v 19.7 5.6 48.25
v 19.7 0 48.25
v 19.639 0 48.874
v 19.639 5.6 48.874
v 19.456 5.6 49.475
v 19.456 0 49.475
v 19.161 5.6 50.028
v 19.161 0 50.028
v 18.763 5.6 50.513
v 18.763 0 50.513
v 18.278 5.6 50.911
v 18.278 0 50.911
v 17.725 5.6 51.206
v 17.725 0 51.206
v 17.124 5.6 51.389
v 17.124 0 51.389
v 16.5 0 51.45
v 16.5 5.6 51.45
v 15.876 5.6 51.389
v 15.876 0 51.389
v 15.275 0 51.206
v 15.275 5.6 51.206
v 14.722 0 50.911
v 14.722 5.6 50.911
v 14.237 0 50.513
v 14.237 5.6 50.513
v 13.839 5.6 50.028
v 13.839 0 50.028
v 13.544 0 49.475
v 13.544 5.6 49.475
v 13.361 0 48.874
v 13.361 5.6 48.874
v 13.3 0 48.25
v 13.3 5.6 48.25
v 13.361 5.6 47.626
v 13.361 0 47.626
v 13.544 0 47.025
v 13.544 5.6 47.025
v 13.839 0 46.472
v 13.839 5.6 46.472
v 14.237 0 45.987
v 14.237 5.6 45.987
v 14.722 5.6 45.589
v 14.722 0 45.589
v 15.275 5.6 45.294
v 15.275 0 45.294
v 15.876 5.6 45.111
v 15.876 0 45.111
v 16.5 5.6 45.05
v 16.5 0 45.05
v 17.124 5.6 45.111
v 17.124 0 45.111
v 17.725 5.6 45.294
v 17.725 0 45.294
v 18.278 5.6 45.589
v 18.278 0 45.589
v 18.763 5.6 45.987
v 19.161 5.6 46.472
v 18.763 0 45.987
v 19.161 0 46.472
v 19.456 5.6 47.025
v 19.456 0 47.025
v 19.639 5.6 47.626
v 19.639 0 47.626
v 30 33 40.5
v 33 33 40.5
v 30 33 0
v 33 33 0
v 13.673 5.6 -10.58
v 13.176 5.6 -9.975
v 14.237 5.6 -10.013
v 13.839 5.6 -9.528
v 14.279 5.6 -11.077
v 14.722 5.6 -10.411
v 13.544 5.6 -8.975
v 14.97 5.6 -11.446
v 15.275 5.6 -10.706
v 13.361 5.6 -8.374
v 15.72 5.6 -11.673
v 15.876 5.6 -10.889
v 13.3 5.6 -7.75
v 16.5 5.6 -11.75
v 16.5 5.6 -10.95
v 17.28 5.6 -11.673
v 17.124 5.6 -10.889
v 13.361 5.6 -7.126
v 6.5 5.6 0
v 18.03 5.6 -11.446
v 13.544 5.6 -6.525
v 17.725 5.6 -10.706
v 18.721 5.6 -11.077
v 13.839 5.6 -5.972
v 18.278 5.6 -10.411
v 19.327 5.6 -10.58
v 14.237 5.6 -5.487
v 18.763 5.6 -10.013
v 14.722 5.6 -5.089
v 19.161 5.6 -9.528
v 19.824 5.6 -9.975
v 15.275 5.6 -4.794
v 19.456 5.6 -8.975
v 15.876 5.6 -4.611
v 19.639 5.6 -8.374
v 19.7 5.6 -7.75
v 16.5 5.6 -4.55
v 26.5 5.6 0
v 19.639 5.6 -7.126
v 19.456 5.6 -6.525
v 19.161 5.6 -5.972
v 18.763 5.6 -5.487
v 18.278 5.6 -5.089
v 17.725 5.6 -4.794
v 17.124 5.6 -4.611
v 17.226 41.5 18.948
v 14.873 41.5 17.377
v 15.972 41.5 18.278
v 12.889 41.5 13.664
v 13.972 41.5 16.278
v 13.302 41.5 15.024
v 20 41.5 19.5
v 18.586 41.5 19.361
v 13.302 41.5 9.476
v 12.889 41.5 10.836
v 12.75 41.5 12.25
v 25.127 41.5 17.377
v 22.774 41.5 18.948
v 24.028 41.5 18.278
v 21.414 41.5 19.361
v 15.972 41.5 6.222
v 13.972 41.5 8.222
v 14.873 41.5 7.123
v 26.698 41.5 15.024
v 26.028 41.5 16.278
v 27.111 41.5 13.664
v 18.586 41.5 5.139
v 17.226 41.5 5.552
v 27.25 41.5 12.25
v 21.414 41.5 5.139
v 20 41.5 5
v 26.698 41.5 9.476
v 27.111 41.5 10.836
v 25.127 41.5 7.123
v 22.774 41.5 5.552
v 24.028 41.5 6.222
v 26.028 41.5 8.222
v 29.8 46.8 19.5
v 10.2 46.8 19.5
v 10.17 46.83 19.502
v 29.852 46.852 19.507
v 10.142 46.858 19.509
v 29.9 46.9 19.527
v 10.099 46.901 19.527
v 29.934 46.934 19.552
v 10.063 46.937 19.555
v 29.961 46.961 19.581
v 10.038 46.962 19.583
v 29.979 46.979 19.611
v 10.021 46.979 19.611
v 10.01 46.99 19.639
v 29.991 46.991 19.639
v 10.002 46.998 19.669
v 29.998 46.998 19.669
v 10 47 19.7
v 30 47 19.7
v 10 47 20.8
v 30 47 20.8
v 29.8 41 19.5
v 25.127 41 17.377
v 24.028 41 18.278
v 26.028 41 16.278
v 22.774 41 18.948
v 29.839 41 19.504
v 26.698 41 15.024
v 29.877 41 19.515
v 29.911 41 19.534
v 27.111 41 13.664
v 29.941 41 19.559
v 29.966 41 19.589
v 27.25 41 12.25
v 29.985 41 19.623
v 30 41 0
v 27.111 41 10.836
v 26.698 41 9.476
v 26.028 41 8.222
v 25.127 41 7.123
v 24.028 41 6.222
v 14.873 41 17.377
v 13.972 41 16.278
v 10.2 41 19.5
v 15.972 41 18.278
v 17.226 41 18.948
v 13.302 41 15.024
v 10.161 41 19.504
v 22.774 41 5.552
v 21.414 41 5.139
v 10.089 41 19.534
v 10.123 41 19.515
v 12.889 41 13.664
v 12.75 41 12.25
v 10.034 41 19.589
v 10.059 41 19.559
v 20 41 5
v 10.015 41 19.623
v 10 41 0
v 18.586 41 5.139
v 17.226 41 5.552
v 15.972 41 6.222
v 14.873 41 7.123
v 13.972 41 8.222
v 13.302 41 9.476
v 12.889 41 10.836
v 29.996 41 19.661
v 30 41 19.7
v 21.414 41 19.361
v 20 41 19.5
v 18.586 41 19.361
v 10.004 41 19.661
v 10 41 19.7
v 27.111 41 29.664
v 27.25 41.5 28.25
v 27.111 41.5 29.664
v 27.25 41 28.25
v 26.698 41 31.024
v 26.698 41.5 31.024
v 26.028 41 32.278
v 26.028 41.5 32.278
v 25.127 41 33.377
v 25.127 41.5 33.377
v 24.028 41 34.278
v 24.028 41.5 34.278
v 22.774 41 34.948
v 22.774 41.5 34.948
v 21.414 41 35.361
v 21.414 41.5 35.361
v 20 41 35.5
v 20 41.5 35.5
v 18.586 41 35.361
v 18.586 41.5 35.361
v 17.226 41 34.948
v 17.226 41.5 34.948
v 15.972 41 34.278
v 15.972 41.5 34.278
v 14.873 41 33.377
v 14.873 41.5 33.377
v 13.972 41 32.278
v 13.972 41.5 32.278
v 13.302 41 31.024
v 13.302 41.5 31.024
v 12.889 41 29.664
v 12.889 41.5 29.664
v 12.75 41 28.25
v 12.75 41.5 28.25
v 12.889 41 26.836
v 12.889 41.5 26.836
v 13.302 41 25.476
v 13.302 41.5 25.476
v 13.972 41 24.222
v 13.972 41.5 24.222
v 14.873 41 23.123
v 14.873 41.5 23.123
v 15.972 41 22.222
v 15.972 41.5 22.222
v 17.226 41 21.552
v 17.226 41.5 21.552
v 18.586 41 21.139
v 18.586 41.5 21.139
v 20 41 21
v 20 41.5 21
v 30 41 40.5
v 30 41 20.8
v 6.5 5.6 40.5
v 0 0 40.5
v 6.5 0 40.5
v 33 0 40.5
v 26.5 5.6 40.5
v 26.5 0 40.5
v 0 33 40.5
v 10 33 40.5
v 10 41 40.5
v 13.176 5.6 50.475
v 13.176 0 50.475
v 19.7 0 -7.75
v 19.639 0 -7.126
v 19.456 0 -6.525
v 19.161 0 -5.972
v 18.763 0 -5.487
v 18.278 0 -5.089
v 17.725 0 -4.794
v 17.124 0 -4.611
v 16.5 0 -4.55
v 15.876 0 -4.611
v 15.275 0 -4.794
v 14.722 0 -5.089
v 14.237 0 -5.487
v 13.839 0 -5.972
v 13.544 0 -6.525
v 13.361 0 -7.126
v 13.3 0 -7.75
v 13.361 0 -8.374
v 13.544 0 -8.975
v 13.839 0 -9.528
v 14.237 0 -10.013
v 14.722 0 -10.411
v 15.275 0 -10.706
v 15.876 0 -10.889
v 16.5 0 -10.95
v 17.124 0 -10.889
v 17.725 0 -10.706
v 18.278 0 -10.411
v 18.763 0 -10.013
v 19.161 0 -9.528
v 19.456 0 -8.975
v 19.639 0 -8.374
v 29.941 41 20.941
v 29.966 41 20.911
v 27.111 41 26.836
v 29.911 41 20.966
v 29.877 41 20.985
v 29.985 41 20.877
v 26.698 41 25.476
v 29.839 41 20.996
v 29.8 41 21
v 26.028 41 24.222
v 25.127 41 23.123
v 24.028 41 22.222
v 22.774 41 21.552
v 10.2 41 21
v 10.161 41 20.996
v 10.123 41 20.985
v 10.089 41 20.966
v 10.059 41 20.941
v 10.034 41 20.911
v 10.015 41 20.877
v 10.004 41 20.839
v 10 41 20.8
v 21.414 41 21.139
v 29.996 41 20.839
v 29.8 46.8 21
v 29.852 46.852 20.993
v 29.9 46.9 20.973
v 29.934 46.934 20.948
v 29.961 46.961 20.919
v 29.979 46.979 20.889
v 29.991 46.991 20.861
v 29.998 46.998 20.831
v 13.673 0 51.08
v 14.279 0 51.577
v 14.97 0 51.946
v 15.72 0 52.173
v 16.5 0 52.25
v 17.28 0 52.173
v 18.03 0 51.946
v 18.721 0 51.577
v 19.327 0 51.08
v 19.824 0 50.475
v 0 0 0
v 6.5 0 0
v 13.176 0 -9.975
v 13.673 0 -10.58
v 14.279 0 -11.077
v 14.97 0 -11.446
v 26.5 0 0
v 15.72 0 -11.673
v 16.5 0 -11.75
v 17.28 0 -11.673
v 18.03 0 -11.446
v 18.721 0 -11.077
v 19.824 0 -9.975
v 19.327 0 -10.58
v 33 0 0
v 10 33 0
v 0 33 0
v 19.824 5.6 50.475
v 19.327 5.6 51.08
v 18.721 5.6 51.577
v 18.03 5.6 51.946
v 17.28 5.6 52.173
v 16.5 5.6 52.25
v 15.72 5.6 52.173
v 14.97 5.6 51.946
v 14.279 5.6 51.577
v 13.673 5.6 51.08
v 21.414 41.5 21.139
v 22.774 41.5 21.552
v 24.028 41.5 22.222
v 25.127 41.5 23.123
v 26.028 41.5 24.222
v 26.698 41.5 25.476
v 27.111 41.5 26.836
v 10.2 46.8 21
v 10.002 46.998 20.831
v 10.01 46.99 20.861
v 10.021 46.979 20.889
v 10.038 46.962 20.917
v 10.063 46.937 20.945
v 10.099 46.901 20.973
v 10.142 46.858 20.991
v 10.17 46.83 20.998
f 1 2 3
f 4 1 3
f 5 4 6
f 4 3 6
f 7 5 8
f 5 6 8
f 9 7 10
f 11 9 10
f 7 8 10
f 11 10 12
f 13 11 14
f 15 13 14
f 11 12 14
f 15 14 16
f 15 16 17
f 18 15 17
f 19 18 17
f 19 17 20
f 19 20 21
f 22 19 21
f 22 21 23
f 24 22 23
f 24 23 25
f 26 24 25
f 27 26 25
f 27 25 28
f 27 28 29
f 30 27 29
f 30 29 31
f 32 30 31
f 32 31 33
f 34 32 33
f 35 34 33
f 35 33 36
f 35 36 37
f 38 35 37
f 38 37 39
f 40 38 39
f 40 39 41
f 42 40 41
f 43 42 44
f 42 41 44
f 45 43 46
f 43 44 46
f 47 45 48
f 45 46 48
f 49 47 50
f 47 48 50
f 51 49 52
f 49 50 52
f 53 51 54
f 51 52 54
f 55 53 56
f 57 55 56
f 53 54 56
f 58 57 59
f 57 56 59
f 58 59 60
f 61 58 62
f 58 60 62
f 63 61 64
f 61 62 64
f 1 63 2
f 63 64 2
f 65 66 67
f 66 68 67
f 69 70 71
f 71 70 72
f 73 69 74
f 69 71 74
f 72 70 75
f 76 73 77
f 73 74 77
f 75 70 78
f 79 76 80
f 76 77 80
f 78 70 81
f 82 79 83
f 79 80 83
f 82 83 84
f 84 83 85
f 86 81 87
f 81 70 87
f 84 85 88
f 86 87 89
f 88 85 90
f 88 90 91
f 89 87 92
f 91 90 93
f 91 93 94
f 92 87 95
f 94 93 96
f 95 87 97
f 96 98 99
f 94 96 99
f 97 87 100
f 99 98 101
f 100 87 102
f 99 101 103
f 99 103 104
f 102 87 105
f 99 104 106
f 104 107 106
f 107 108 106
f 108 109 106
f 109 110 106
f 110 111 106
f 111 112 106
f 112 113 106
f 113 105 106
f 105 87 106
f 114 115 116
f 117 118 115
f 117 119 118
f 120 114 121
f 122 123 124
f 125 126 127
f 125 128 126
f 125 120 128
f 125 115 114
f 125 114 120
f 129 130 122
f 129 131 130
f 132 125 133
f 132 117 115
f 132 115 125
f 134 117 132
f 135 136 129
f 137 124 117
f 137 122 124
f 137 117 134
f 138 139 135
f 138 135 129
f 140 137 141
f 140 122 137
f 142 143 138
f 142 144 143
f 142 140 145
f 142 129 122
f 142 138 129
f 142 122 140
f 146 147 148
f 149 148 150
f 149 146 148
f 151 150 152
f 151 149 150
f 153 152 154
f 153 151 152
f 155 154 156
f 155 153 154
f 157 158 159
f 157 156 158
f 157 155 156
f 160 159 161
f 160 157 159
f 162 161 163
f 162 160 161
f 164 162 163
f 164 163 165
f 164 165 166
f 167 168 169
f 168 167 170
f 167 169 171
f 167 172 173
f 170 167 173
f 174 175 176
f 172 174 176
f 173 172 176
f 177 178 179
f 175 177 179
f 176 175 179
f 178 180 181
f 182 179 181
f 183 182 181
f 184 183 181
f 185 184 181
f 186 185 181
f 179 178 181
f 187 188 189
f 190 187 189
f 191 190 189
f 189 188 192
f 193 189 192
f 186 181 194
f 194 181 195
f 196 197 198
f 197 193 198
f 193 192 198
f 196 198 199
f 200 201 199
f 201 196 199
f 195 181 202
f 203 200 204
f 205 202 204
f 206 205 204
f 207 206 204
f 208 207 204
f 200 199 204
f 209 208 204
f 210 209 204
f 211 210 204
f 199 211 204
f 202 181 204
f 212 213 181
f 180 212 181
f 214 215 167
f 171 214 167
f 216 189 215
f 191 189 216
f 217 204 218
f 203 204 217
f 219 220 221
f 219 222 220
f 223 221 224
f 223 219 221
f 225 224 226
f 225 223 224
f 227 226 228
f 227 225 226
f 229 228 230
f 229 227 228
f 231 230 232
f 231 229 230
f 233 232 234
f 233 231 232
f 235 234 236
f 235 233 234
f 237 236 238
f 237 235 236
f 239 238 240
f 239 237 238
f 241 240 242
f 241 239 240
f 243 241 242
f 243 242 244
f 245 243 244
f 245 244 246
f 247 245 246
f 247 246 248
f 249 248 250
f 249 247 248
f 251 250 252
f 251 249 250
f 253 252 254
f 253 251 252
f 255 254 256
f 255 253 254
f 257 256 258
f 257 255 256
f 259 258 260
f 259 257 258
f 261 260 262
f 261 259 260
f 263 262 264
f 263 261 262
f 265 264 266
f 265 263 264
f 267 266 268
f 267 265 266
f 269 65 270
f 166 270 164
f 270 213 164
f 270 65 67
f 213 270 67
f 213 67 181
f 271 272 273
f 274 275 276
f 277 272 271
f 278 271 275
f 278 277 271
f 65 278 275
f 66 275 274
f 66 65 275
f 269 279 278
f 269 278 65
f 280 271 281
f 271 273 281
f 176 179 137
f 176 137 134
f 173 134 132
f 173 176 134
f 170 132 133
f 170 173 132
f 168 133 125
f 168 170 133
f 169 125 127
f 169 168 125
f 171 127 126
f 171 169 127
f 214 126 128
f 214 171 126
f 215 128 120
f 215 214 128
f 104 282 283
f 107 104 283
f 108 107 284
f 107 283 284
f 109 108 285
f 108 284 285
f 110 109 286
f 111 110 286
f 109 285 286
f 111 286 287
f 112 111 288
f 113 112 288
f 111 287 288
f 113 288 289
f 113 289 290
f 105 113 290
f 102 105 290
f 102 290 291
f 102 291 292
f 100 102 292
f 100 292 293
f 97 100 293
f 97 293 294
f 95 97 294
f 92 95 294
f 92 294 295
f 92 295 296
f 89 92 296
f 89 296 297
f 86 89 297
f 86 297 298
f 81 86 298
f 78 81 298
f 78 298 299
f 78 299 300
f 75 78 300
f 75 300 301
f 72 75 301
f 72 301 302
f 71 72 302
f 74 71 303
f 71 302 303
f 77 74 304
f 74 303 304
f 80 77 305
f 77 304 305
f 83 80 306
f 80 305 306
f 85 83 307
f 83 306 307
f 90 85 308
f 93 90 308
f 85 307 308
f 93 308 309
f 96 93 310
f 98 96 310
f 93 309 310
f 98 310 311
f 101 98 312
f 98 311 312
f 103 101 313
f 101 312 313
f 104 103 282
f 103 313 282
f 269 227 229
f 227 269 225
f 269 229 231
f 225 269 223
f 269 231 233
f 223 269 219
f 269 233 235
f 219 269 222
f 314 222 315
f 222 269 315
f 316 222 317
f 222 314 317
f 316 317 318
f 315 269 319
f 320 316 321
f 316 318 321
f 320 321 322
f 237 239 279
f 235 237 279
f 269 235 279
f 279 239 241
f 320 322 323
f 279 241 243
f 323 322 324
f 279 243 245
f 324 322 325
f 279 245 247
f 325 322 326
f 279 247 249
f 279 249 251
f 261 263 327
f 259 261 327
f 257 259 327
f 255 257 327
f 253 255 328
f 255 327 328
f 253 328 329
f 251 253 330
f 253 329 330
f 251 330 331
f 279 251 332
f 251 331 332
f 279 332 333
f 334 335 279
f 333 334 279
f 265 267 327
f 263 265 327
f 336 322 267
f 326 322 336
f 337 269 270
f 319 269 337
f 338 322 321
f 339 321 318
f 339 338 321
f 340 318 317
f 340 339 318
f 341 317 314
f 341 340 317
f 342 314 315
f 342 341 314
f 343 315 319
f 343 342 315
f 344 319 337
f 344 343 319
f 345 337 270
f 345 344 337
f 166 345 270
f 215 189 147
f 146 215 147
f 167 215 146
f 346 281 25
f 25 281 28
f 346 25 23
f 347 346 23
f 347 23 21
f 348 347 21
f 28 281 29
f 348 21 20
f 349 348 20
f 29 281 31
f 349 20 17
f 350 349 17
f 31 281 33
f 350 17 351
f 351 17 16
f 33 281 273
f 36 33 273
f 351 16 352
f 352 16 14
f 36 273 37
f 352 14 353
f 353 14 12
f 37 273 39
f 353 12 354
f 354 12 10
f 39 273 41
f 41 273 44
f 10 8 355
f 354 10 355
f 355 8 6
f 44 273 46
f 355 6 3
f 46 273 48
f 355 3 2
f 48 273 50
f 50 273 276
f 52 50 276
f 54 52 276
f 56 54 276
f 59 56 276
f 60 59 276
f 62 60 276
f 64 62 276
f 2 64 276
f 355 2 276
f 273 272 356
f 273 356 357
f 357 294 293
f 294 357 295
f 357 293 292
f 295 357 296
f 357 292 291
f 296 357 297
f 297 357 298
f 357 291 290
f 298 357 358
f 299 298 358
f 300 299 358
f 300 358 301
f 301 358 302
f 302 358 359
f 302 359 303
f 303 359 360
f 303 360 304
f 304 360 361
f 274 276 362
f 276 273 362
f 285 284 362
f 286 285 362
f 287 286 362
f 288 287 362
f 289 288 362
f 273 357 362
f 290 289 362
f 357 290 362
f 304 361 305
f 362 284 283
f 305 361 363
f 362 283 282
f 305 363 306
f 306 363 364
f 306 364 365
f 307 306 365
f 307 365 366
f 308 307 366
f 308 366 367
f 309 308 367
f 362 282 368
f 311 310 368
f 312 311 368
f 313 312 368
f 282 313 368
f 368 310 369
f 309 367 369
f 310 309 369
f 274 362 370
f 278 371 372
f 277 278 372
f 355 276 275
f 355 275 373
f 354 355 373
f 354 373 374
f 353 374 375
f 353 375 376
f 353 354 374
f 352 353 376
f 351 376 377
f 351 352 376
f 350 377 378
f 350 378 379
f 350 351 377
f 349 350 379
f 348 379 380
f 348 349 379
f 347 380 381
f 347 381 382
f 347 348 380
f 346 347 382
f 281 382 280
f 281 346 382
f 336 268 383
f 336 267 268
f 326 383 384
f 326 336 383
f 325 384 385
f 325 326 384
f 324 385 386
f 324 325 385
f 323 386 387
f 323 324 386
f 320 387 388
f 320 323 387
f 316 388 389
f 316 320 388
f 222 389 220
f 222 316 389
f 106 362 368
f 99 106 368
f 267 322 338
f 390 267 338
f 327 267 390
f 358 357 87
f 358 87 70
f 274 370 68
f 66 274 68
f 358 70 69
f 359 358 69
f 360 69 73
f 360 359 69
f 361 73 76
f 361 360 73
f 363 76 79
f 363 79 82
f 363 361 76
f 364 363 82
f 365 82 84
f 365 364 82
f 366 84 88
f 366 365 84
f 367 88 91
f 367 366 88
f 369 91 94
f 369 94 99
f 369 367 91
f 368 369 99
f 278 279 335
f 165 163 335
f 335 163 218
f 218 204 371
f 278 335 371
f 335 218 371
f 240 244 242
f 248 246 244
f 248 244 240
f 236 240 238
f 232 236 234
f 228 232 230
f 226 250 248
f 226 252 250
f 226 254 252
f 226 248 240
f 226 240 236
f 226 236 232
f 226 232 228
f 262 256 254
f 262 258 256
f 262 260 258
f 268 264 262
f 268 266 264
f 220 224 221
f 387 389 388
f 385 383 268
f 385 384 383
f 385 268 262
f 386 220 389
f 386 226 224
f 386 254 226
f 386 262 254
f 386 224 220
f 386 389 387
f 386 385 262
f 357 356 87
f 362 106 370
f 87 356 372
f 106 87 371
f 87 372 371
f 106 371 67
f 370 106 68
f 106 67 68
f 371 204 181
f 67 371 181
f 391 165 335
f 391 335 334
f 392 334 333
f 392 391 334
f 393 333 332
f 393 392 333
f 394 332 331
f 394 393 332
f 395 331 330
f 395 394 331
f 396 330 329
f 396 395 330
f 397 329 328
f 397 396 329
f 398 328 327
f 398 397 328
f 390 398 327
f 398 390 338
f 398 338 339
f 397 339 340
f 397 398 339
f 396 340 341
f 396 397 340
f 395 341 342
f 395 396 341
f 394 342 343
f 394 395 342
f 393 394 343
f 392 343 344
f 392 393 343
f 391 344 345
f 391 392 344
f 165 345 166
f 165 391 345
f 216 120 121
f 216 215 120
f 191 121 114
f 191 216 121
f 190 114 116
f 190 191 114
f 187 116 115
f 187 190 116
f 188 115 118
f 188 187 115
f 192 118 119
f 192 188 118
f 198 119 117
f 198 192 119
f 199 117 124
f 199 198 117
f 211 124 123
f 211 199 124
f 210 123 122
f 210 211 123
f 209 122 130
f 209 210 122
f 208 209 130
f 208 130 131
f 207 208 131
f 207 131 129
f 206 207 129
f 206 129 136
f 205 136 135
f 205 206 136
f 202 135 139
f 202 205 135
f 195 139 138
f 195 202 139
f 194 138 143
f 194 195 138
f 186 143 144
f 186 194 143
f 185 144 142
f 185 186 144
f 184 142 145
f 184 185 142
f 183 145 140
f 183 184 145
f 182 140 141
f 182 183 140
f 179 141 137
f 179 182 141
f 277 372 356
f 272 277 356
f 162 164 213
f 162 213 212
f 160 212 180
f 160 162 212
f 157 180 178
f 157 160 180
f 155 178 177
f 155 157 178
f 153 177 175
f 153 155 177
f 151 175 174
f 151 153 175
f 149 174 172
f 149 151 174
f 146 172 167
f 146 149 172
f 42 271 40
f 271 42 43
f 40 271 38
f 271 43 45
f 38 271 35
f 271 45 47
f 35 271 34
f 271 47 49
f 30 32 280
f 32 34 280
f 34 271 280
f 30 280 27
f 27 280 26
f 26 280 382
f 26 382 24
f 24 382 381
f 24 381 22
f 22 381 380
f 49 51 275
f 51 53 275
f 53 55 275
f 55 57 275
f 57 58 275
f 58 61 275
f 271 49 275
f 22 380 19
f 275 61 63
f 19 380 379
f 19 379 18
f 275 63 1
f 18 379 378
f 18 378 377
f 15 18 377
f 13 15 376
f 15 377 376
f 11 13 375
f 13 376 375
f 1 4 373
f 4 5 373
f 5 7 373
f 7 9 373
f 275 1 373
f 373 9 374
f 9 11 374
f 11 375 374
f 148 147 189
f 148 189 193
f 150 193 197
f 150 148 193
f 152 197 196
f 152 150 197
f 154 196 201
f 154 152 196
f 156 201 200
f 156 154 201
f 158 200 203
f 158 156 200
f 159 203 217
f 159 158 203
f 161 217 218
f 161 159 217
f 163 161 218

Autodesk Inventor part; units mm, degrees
ref_plane "YZ Plane" through (0, 0, 0) normal (1, 0, 0) x (0, 1, 0)
ref_plane "XZ Plane" through (0, 0, 0) normal (0, 1, 0) x (-1, 0, 0)
ref_plane "XY Plane" through (0, 0, 0) normal (0, 0, 1) x (1, 0, 0)
sketch "Boceto1" plane through (0, 0, 0) normal (0, 0, 1) x (1, 0, 0)
  line L0 (0, 0) -> (33, 0)
  line L1 (33, 0) -> (33, 33)
  line L2 (33, 33) -> (0, 33)
  line L3 (0, 33) -> (0, 0)
  line L4 (10, 33) -> (30, 33)
  line L5 (30, 33) -> (30, 41)
  line L6 (30, 41) -> (10, 41)
  line L7 (10, 41) -> (10, 33)
  point P0 (30, 33)
  dimension "d4" = 33
  dimension "d5" = 33
  dimension "d6" = 41
  dimension "d7" = 3
  dimension "d8" = 10
extrude "Extrusión1" add sketch "Boceto1" along normal blind 40.5
sketch "Boceto2" plane through (10, 41, 0) normal (0, 1, 0) x (1, 0, 0)
  line L0 (20, -21) -> (0, -21)
  line L1 (0, -21) -> (0, -19.5)
  line L2 (0, -19.5) -> (20, -19.5)
  line L3 (20, -19.5) -> (20, -21)
  line L4 (0, 0) -> (0, -40.5) projected
  line L5 (20, 0) -> (20, -40.5) projected
  point P0 (-10, 0)
  point P1 (0, -20.25)
  point P2 (20, -20.25)
  dimension "d11" = 1.5
extrude "Extrusión2" add sketch "Boceto2" along normal blind 6
fillet "Empalme1" radius 0.2 6 edges at (10, 44, 21) (20, 47, 21) (30, 44, 21) (10, 44, 19.5) (20, 47, 19.5) (30, 44, 19.5)
sketch "Boceto3" plane through (10, 41, 40.5) normal (0, 1, 0) x (1, 0, 0)
  line L0 (0, 40.5) -> (0, 0) projected
  line L1 (0, 20.25) -> (20, 20.25)
  line L2 (20, 40.5) -> (20, 0) projected
  line L3 (10, 20.25) -> (10, 28.25)
  line L4 (10, 20.25) -> (10, 12.25)
  line L5 (19.8, 19.5) -> (0.2, 19.5) projected
  line L6 (10, 19.5) -> (12.8197, 19.5)
  line L7 (0.2, 21) -> (19.8, 21) projected
  line L8 (10, 21) -> (12.8197, 21)
  circle A0 centre (10, 12.25) radius 7.25
  circle A1 centre (10, 28.25) radius 7.25
  point P0 (-10, 40.5)
  dimension "d15" = 8
  dimension "d16" = 8
extrude "Extrusión3" add sketch "Boceto3" along normal blind 0.5
sketch "Boceto4" plane through (0, 0, 0) normal (0, -1, 0) x (1, 0, 0)
  line L0 (0, 0) -> (33, 0) projected
  line L1 (16.5, 0) -> (16.5, 40.5)
  line L2 (0, 40.5) -> (33, 40.5) projected
  line L3 (16.5, 20.25) -> (16.5, 48.25)
  circle A0 centre (16.5, 48.25) radius 3.2
  circle A1 centre (16.5, 48.25) radius 4
  line L4 (16.5, 40.5) -> (6.5, 40.5)
  line L5 (16.5, 40.5) -> (26.5, 40.5)
  line L6 (26.5, 40.5) -> (19.8242, 50.4748)
  line L7 (6.5, 40.5) -> (13.1758, 50.4748)
  line L8 (16.5, 20.25) -> (16.5, -7.75)
  circle A2 centre (16.5, -7.75) radius 3.2
  circle A3 centre (16.5, -7.75) radius 4
  line L9 (6.5, 0) -> (26.5, 0)
  line L10 (6.5, 0) -> (13.1758, -9.9748)
  line L11 (26.5, 0) -> (19.8242, -9.9748)
  dimension "d19" = 28
  dimension "d20" = 6.4
  dimension "d21" = 8
  dimension "d22" = 10
  dimension "d23" = 10
  dimension "d26" = 28
  dimension "d27" = 6.4
  dimension "d28" = 8
  dimension "d29" = 20
  dimension "d30" = 6.5
extrude "Extrusión4" add sketch "Boceto4" against normal blind 5.6
equation "\"d4\" = DistA"
equation "\"d5\" = DistC"
equation "\"d6\" = DistB"
equation "\"d9\" = DistEXT"
equation "\"d12\" = DistEXT2"
equation "\"d24\" = DistEXT3"
equation "\"DistA\" = 33"
equation "\"DistB\" = 41"
equation "\"DistEXT\" = 40.5"
equation "\"DistC\" = 33"
equation "\"DistEXT2\" = 6"
equation "\"DistEXT3\" = 5.6"
properties part number "Pieza3-Tarea2"
